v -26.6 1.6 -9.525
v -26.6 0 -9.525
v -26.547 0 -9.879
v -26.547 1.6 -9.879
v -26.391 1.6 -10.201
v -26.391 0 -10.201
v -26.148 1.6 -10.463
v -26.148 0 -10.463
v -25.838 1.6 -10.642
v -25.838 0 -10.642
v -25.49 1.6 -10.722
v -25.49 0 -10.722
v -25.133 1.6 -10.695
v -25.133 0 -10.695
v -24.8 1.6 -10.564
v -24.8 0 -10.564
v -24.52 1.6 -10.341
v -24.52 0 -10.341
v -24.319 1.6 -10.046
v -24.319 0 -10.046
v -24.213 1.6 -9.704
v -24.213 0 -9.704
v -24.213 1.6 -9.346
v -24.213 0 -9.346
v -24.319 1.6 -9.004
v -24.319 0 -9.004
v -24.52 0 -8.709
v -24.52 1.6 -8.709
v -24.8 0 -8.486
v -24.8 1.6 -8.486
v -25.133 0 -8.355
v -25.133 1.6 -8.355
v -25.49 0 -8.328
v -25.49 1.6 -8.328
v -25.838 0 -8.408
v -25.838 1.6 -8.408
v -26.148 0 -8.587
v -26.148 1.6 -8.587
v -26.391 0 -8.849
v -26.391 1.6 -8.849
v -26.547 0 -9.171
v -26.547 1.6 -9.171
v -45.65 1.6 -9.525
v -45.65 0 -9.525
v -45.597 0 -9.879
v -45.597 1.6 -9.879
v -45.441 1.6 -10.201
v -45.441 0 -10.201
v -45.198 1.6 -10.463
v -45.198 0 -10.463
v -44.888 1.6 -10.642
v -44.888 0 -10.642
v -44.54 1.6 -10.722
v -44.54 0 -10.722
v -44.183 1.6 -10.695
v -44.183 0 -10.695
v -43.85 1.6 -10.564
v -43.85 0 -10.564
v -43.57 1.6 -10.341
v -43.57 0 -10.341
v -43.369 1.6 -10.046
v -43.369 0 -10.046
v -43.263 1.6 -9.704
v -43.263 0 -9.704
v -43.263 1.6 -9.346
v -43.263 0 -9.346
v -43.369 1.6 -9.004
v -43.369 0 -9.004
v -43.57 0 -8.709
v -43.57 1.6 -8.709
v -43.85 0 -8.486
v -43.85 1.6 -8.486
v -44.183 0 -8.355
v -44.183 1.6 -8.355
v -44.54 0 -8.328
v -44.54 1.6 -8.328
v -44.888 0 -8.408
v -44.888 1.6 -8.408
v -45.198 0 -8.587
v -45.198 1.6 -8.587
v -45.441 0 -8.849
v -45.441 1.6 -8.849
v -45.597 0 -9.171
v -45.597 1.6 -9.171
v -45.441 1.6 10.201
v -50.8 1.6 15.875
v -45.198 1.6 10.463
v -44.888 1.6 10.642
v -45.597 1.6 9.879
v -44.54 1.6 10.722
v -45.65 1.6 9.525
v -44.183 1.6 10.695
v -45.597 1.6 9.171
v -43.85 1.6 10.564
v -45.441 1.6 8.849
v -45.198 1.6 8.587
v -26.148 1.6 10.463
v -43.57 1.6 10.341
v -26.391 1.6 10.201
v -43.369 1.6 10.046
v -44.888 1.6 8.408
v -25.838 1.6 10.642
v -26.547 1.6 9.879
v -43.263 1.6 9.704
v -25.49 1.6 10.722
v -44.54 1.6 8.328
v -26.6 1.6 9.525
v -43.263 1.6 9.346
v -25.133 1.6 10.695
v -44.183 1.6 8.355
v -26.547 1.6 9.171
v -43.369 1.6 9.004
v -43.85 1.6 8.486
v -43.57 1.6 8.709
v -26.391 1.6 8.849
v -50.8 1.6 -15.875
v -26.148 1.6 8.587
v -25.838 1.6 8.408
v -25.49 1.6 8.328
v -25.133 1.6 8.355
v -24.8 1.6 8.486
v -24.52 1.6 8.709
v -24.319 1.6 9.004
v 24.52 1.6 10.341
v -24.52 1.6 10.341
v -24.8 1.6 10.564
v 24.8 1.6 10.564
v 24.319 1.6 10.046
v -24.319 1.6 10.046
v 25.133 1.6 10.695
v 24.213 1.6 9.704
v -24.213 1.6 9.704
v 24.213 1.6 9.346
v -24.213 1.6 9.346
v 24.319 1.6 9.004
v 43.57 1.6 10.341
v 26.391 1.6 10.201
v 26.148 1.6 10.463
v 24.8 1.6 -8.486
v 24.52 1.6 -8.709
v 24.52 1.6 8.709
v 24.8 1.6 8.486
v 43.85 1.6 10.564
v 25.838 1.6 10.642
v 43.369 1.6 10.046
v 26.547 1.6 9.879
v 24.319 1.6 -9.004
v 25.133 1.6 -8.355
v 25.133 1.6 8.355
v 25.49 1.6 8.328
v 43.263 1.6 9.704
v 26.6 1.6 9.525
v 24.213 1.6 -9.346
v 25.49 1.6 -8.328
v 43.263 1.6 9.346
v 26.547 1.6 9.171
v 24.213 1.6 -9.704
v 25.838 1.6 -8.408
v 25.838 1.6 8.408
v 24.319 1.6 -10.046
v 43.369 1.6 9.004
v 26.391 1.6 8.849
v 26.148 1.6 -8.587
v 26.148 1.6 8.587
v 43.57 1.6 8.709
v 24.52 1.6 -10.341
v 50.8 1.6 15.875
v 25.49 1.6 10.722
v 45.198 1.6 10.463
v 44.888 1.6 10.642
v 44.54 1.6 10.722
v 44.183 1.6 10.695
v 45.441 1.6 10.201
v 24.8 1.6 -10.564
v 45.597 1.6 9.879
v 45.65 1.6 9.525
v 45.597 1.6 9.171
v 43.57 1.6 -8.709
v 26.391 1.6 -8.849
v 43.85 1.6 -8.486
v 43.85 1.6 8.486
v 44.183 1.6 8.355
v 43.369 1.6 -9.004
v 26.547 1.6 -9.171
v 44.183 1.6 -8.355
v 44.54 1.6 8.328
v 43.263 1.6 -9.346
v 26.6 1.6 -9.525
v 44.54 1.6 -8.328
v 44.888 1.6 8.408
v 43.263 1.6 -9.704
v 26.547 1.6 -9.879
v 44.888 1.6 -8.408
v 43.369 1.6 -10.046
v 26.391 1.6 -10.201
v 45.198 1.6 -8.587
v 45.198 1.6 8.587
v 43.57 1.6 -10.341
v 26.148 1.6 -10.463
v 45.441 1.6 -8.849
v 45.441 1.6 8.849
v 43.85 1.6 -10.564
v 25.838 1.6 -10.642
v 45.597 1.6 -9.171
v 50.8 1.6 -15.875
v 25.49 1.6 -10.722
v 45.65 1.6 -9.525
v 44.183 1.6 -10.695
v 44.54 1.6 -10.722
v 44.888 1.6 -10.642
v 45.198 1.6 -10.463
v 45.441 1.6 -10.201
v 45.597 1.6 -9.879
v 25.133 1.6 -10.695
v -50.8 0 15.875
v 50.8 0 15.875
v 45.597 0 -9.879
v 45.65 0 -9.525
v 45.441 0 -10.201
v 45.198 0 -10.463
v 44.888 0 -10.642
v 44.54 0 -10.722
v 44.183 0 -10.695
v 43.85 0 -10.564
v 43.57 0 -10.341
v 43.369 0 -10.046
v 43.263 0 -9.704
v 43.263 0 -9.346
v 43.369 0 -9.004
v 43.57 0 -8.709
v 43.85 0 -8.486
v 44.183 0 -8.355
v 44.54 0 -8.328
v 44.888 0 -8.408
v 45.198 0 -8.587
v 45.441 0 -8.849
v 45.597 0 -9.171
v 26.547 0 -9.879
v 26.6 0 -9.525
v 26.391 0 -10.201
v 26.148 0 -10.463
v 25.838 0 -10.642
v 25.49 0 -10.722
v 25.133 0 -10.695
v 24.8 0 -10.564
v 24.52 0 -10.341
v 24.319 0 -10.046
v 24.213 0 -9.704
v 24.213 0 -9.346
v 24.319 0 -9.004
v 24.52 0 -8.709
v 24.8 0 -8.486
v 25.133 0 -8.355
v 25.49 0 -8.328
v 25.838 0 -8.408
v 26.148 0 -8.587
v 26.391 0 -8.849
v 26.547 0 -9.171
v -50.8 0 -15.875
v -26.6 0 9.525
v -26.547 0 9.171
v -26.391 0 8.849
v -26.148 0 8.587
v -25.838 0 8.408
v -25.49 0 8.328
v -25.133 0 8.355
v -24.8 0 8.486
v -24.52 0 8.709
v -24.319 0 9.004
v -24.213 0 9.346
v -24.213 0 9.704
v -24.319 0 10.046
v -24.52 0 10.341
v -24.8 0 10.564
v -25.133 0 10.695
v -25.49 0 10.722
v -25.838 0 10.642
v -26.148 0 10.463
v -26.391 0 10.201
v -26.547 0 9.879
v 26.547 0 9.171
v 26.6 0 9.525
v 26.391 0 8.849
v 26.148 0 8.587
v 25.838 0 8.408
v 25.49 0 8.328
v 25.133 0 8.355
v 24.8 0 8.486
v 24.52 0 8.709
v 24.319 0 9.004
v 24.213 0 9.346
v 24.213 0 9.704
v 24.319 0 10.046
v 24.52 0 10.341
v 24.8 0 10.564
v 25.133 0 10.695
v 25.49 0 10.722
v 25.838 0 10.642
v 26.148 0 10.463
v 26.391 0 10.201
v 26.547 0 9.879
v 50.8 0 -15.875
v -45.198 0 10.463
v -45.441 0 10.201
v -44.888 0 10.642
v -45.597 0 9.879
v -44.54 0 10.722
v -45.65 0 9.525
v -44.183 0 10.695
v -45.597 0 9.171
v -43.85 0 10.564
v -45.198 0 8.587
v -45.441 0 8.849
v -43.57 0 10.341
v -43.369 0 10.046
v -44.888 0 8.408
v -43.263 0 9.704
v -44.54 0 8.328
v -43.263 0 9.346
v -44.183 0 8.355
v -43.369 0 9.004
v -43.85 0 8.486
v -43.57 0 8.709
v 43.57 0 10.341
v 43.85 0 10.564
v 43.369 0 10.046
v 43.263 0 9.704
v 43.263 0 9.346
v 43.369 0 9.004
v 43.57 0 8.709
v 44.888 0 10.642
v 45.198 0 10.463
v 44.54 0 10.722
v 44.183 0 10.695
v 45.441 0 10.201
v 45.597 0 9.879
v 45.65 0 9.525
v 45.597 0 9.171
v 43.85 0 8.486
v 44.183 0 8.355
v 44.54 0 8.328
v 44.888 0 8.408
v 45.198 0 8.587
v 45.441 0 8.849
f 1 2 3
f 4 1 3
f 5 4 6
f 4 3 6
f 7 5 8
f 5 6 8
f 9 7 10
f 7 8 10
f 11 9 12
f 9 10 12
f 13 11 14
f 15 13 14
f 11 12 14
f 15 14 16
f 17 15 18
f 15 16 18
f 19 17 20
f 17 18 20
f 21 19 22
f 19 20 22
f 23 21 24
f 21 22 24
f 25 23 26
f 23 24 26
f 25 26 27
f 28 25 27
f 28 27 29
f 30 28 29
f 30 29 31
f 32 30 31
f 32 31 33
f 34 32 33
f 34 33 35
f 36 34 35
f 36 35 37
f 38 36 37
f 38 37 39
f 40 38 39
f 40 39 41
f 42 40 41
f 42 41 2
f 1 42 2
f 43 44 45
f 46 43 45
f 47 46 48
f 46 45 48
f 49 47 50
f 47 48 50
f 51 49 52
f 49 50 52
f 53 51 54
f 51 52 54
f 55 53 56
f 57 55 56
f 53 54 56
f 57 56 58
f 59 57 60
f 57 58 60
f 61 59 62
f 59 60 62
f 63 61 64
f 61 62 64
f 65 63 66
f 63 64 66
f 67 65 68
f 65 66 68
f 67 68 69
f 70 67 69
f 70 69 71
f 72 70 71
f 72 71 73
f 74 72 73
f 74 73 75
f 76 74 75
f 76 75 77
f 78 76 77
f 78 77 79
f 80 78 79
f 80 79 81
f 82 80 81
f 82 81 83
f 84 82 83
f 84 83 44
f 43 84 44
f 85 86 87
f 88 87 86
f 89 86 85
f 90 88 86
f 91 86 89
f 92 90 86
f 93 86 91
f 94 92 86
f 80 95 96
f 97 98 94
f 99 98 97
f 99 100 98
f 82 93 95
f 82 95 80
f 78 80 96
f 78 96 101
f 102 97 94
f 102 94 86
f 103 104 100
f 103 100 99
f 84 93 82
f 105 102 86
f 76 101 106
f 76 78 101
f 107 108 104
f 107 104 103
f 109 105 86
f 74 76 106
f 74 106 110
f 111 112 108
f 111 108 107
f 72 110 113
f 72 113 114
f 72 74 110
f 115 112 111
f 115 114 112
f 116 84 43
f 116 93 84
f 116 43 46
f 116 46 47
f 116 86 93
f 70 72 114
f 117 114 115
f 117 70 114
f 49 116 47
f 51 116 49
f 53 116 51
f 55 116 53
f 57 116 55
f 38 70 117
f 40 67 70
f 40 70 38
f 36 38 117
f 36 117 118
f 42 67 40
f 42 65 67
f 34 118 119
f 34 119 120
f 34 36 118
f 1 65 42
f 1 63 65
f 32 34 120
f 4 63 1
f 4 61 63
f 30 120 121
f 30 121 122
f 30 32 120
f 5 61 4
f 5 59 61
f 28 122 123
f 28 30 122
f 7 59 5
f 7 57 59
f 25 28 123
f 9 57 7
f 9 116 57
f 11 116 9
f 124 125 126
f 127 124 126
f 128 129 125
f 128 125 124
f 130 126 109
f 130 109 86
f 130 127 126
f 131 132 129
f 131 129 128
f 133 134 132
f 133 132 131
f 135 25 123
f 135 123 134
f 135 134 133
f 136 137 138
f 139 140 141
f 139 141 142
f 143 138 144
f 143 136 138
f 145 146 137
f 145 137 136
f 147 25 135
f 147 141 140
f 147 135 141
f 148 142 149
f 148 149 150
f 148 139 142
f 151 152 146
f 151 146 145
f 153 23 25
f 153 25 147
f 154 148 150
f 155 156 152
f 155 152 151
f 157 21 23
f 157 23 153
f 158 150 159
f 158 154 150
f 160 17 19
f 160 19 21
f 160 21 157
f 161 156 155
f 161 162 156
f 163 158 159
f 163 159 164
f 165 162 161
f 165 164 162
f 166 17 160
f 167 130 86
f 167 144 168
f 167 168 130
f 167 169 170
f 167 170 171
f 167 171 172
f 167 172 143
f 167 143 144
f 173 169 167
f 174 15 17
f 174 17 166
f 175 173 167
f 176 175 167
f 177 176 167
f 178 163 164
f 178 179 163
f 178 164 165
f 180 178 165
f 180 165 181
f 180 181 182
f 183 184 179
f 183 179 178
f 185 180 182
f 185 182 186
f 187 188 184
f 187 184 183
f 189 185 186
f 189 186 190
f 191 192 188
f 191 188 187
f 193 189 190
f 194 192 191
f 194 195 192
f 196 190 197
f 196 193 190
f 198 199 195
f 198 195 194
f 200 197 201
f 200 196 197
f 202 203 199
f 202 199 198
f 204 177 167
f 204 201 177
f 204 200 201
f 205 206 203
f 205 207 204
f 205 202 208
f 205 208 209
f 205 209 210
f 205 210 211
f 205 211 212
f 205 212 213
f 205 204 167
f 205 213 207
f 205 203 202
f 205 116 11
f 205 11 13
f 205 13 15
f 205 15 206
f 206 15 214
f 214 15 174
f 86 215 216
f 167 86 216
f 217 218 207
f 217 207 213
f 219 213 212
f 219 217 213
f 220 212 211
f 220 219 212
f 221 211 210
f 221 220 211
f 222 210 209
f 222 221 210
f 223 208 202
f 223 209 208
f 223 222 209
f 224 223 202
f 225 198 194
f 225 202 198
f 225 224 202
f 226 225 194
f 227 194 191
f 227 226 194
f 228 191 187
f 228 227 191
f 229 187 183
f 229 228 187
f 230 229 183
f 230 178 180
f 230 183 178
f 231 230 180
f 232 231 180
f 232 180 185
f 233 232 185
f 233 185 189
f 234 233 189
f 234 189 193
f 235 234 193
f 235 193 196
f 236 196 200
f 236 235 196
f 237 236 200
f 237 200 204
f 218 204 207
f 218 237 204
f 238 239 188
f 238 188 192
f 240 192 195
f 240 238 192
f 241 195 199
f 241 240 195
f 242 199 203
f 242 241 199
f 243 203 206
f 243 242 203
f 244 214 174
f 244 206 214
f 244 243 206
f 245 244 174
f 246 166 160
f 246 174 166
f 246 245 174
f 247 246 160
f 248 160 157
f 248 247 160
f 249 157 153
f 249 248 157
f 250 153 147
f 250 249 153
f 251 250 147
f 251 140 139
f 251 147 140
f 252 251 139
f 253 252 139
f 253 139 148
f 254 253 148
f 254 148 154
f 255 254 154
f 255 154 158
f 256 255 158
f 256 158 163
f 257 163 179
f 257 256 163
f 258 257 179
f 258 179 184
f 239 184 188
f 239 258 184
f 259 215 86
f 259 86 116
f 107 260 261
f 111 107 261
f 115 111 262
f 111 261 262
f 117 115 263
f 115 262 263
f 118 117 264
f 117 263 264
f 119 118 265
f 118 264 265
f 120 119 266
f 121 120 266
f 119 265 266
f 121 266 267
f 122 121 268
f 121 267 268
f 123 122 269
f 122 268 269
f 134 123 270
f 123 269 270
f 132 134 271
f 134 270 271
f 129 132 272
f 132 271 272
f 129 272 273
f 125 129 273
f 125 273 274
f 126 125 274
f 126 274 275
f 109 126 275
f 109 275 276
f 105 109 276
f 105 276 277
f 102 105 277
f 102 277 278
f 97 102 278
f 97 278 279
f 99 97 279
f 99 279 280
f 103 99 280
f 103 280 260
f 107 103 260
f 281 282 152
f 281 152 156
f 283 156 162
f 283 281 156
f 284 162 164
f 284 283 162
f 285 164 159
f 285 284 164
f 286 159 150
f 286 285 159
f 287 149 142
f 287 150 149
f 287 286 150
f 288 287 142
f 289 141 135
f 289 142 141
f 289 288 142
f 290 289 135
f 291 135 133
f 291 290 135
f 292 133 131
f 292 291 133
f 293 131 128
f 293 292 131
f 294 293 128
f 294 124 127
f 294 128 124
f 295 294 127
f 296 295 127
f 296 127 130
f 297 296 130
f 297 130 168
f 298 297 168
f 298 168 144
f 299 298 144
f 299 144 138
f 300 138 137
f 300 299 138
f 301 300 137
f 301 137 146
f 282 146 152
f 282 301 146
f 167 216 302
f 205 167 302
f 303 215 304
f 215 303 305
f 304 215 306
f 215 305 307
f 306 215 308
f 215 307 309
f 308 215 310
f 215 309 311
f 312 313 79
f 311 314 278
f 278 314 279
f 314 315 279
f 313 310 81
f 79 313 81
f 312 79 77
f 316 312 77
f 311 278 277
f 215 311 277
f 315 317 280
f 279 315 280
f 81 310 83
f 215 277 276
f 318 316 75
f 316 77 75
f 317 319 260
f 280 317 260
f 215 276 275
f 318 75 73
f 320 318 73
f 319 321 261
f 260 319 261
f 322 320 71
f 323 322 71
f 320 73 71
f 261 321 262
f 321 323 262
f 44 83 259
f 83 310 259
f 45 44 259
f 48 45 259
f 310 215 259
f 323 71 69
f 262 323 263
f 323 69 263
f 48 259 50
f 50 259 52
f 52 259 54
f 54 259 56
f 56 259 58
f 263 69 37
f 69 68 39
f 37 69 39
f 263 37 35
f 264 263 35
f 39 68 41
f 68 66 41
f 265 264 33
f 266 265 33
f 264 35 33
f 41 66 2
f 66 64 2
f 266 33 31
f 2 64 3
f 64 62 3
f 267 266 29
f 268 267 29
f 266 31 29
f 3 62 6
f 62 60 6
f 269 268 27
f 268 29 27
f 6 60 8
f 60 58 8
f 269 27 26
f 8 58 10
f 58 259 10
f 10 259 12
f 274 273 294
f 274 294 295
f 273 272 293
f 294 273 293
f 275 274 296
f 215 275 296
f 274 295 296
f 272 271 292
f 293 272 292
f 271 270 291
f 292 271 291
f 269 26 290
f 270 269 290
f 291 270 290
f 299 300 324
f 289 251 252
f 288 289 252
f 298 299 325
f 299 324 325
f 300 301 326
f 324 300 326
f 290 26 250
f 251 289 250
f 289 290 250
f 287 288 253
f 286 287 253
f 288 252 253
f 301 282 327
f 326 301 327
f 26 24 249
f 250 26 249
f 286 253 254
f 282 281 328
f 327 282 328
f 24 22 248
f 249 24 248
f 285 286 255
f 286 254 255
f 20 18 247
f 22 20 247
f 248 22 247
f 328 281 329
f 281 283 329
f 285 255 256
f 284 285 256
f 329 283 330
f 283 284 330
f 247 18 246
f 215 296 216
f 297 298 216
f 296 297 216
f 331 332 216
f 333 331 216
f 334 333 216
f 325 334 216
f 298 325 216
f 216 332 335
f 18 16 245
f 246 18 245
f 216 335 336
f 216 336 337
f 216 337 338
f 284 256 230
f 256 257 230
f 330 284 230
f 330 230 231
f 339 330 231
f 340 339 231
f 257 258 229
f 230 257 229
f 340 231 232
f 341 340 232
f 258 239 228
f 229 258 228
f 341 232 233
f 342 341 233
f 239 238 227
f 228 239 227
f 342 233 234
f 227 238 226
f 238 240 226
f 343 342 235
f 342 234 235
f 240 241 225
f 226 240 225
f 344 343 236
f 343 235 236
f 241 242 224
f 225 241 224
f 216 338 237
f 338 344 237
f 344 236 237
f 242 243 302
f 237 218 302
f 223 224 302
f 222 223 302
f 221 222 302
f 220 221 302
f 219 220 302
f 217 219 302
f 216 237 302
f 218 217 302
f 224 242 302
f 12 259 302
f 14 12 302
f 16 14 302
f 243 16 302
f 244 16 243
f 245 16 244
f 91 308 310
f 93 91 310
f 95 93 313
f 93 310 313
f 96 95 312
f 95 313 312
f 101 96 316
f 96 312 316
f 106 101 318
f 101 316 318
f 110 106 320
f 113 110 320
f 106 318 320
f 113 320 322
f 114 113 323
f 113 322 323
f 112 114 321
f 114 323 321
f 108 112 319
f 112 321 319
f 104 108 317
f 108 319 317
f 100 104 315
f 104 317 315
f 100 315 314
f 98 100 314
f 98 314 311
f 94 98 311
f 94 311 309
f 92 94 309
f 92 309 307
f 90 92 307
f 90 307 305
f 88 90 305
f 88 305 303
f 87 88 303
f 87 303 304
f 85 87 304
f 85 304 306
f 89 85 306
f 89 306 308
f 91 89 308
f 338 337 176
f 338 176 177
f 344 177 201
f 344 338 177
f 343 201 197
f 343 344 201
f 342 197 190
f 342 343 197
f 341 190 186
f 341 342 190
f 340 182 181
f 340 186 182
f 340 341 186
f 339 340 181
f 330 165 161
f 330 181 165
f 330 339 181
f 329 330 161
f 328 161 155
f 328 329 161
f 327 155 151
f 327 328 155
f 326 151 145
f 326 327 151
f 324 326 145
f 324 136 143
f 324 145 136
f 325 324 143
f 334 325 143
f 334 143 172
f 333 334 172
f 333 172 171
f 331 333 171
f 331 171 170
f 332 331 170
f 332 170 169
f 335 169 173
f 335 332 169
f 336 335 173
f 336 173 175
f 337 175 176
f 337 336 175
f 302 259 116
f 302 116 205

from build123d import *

# Parameters (mm, degrees)
SKETCH1_W            = 101.6
SKETCH1_H            = 31.75
BOSS_EXTRUDE1_DEPTH  = 1.6002
M2_CLEARANCE_HOLE1_D = 2.4


with BuildPart() as part:
    # Sketch1 → Boss-Extrude1 (new body)
    with BuildSketch(Plane(origin=(0, 0, 0), x_dir=(1, 0, 0), z_dir=(0, 1, 0))):
        Rectangle(SKETCH1_W, SKETCH1_H)
    extrude(amount=BOSS_EXTRUDE1_DEPTH)

    # M2 Clearance Hole1 (through all)
    with Locations(Plane(origin=(0, 1.6002, 0), x_dir=(1, 0, 0), z_dir=(0, 1, 0))):
        with Locations((-25.4, 9.525), (-44.45, 9.525), (-44.45, -9.525), (-25.4, -9.525)):
            m2_clearance_hole1 = Hole(M2_CLEARANCE_HOLE1_D / 2)

    # Mirror1: M2 Clearance Hole1 across plane
    add(m2_clearance_hole1.mirror(Plane(origin=(0, 0, 0), x_dir=(0, 0, 1), z_dir=(1, 0, 0))), mode=Mode.SUBTRACT)


solid = part.part
